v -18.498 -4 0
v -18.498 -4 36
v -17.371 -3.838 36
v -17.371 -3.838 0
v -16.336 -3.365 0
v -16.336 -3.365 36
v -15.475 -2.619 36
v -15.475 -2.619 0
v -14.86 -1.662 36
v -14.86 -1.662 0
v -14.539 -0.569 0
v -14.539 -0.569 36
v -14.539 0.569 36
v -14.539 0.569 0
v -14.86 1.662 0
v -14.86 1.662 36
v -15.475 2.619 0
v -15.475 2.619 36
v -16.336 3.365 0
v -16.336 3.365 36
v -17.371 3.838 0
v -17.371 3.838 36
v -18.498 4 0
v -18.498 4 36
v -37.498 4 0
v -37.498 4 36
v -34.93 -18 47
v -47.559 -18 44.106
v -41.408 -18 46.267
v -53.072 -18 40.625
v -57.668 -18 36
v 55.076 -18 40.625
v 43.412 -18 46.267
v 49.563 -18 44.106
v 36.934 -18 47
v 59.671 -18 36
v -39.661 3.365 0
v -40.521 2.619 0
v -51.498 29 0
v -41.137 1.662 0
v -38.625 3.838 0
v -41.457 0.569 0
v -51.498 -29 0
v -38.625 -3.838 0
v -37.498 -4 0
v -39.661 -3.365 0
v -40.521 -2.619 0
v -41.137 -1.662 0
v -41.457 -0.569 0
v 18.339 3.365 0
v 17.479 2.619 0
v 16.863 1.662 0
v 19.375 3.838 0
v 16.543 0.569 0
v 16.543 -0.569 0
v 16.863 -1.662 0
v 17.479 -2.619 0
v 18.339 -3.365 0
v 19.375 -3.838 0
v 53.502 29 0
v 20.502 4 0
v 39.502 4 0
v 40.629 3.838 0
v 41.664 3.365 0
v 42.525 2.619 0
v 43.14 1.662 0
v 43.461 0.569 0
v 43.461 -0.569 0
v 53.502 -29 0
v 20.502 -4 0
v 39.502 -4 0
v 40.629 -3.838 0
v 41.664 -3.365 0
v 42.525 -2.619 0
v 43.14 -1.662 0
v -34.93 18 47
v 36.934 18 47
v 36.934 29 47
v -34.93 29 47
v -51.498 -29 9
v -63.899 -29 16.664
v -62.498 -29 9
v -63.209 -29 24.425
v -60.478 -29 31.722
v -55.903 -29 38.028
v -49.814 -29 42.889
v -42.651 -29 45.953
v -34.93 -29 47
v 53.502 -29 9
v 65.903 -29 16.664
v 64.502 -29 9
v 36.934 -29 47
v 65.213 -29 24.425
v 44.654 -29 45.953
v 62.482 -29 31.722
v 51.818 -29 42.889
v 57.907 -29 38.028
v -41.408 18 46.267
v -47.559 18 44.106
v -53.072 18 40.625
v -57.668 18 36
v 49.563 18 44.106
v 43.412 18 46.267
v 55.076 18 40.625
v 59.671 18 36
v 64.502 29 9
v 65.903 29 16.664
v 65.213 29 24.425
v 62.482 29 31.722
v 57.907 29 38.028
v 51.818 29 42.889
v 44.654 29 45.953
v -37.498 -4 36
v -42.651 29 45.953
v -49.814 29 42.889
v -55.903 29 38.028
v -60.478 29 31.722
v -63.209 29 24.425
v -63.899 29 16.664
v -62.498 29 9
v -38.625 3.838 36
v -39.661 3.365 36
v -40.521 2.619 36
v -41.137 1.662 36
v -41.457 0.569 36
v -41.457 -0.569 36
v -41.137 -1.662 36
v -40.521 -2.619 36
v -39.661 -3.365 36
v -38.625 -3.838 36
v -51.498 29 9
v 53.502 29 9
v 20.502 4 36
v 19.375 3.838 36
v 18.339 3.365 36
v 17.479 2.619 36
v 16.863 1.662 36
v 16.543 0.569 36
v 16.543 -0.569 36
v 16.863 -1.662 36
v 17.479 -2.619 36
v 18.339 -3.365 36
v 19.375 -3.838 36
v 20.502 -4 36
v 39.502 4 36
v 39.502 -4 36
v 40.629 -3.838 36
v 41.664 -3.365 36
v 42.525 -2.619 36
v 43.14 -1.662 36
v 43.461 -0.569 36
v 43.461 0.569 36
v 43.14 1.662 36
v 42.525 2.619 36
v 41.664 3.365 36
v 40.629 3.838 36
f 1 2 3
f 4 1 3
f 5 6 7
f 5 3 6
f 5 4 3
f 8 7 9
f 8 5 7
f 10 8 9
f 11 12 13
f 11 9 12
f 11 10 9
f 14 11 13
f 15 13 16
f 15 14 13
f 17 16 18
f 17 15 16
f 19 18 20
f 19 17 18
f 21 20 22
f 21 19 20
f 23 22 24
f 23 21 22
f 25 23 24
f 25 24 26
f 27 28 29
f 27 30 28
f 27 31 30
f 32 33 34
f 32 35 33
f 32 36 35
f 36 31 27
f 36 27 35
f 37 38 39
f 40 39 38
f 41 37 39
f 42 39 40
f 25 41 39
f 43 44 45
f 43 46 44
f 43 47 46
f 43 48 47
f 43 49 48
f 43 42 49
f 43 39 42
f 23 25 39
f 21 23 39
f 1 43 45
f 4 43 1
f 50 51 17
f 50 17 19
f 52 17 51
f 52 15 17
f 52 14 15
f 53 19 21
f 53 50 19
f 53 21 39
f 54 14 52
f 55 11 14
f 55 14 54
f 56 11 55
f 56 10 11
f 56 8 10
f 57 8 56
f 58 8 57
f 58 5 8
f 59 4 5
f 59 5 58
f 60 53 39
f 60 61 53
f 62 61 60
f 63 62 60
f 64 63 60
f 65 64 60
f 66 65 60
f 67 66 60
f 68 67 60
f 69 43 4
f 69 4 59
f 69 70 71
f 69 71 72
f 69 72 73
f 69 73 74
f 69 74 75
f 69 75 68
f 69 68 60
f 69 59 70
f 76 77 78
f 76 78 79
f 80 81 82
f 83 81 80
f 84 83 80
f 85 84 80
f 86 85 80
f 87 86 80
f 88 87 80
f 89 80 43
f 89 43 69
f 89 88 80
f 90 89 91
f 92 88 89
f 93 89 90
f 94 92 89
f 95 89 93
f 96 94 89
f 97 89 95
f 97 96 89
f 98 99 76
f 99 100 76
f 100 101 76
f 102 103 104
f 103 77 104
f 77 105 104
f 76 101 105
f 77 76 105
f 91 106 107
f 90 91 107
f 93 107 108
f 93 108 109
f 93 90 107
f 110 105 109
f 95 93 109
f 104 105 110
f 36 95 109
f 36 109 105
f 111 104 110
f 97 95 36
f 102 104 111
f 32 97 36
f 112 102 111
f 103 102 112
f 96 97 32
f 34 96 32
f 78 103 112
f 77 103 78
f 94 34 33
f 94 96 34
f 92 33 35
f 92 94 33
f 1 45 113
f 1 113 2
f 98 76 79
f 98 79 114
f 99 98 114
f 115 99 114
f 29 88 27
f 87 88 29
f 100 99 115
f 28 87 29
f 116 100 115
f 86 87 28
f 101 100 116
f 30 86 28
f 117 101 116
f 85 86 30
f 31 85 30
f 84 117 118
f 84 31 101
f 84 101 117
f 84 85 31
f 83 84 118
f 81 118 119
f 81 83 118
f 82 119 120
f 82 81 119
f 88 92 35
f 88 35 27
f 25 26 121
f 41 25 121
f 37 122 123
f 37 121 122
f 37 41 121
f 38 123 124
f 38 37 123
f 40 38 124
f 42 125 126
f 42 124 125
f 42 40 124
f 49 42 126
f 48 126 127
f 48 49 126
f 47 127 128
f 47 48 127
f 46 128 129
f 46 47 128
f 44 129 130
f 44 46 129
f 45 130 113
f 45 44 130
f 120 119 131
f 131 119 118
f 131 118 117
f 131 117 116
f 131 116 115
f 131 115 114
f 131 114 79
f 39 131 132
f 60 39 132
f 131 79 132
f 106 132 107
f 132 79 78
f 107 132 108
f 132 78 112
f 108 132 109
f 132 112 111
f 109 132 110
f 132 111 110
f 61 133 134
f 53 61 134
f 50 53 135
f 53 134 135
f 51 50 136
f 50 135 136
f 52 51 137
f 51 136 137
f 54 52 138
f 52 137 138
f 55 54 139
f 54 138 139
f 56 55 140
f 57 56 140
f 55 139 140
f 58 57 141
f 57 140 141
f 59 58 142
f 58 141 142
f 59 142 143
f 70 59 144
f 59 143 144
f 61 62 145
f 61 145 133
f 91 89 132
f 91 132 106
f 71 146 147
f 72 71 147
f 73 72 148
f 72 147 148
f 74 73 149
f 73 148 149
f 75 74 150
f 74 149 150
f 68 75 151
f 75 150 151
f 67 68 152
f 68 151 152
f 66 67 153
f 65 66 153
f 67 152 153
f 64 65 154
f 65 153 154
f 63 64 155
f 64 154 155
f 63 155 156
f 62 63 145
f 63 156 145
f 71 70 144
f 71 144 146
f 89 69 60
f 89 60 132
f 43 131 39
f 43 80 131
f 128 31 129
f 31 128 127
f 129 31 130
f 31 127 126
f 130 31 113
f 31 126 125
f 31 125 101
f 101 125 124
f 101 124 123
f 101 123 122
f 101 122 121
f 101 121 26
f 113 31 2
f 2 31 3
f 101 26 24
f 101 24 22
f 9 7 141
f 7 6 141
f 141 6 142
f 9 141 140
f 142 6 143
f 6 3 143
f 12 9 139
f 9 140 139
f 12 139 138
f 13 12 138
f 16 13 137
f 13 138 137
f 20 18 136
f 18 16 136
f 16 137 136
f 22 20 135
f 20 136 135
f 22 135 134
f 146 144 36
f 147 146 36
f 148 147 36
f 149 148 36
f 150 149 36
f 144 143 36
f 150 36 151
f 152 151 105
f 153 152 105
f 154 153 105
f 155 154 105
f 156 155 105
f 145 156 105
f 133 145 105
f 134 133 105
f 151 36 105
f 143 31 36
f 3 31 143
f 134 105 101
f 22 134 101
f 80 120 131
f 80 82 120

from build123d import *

# Parameters (mm, degrees)
F1_DEPTH = 29
F2_W     = 36
F2_H     = 11
F3_DEPTH = 63.5
F5_DEPTH = 50


with BuildPart() as f1:
    # F0 (on Front) → F1 (new body, symmetric)
    with BuildSketch(Plane.XZ):
        with BuildLine():
            Line((-51.498091, 9), (-51.498091, 0))
            Line((-51.498091, 0), (53.501909, 0))
            Line((53.501909, 0), (53.501909, 9))
            Line((53.501909, 9), (64.501909, 9))
            ThreePointArc((64.501909, 9), (60.407201, 35.029386), (36.933812, 47))
            Line((36.933812, 47), (-34.929993, 47))
            ThreePointArc((-34.929993, 47), (-58.403383, 35.029386), (-62.498091, 9))
            Line((-62.498091, 9), (-51.498091, 9))
        make_face()
    extrude(amount=F1_DEPTH, both=True)

    # F2 (on Right) → F3 (cut, symmetric)
    with BuildSketch(Plane.YZ):
        with Locations((0, 41.5)):
            Rectangle(F2_W, F2_H)
    extrude(amount=F3_DEPTH, both=True, mode=Mode.SUBTRACT)

    # F4 (on Top) → F5 (cut, symmetric)
    with BuildSketch(Plane.XY):
        with BuildLine():
            Line((-18.498091, 4), (-37.498091, 4))
            ThreePointArc((-37.498091, 4), (-41.498091, 0), (-37.498091, -4))
            Line((-37.498091, -4), (-18.498091, -4))
            ThreePointArc((-18.498091, -4), (-14.498091, 0), (-18.498091, 4))
        make_face()
        with BuildLine():
            Line((20.501909, -4), (39.501909, -4))
            ThreePointArc((39.501909, -4), (43.501909, 0), (39.501909, 4))
            Line((39.501909, 4), (20.501909, 4))
            ThreePointArc((20.501909, 4), (16.501909, 0), (20.501909, -4))
        make_face()
    extrude(amount=F5_DEPTH, both=True, mode=Mode.SUBTRACT)


solid = f1.part
